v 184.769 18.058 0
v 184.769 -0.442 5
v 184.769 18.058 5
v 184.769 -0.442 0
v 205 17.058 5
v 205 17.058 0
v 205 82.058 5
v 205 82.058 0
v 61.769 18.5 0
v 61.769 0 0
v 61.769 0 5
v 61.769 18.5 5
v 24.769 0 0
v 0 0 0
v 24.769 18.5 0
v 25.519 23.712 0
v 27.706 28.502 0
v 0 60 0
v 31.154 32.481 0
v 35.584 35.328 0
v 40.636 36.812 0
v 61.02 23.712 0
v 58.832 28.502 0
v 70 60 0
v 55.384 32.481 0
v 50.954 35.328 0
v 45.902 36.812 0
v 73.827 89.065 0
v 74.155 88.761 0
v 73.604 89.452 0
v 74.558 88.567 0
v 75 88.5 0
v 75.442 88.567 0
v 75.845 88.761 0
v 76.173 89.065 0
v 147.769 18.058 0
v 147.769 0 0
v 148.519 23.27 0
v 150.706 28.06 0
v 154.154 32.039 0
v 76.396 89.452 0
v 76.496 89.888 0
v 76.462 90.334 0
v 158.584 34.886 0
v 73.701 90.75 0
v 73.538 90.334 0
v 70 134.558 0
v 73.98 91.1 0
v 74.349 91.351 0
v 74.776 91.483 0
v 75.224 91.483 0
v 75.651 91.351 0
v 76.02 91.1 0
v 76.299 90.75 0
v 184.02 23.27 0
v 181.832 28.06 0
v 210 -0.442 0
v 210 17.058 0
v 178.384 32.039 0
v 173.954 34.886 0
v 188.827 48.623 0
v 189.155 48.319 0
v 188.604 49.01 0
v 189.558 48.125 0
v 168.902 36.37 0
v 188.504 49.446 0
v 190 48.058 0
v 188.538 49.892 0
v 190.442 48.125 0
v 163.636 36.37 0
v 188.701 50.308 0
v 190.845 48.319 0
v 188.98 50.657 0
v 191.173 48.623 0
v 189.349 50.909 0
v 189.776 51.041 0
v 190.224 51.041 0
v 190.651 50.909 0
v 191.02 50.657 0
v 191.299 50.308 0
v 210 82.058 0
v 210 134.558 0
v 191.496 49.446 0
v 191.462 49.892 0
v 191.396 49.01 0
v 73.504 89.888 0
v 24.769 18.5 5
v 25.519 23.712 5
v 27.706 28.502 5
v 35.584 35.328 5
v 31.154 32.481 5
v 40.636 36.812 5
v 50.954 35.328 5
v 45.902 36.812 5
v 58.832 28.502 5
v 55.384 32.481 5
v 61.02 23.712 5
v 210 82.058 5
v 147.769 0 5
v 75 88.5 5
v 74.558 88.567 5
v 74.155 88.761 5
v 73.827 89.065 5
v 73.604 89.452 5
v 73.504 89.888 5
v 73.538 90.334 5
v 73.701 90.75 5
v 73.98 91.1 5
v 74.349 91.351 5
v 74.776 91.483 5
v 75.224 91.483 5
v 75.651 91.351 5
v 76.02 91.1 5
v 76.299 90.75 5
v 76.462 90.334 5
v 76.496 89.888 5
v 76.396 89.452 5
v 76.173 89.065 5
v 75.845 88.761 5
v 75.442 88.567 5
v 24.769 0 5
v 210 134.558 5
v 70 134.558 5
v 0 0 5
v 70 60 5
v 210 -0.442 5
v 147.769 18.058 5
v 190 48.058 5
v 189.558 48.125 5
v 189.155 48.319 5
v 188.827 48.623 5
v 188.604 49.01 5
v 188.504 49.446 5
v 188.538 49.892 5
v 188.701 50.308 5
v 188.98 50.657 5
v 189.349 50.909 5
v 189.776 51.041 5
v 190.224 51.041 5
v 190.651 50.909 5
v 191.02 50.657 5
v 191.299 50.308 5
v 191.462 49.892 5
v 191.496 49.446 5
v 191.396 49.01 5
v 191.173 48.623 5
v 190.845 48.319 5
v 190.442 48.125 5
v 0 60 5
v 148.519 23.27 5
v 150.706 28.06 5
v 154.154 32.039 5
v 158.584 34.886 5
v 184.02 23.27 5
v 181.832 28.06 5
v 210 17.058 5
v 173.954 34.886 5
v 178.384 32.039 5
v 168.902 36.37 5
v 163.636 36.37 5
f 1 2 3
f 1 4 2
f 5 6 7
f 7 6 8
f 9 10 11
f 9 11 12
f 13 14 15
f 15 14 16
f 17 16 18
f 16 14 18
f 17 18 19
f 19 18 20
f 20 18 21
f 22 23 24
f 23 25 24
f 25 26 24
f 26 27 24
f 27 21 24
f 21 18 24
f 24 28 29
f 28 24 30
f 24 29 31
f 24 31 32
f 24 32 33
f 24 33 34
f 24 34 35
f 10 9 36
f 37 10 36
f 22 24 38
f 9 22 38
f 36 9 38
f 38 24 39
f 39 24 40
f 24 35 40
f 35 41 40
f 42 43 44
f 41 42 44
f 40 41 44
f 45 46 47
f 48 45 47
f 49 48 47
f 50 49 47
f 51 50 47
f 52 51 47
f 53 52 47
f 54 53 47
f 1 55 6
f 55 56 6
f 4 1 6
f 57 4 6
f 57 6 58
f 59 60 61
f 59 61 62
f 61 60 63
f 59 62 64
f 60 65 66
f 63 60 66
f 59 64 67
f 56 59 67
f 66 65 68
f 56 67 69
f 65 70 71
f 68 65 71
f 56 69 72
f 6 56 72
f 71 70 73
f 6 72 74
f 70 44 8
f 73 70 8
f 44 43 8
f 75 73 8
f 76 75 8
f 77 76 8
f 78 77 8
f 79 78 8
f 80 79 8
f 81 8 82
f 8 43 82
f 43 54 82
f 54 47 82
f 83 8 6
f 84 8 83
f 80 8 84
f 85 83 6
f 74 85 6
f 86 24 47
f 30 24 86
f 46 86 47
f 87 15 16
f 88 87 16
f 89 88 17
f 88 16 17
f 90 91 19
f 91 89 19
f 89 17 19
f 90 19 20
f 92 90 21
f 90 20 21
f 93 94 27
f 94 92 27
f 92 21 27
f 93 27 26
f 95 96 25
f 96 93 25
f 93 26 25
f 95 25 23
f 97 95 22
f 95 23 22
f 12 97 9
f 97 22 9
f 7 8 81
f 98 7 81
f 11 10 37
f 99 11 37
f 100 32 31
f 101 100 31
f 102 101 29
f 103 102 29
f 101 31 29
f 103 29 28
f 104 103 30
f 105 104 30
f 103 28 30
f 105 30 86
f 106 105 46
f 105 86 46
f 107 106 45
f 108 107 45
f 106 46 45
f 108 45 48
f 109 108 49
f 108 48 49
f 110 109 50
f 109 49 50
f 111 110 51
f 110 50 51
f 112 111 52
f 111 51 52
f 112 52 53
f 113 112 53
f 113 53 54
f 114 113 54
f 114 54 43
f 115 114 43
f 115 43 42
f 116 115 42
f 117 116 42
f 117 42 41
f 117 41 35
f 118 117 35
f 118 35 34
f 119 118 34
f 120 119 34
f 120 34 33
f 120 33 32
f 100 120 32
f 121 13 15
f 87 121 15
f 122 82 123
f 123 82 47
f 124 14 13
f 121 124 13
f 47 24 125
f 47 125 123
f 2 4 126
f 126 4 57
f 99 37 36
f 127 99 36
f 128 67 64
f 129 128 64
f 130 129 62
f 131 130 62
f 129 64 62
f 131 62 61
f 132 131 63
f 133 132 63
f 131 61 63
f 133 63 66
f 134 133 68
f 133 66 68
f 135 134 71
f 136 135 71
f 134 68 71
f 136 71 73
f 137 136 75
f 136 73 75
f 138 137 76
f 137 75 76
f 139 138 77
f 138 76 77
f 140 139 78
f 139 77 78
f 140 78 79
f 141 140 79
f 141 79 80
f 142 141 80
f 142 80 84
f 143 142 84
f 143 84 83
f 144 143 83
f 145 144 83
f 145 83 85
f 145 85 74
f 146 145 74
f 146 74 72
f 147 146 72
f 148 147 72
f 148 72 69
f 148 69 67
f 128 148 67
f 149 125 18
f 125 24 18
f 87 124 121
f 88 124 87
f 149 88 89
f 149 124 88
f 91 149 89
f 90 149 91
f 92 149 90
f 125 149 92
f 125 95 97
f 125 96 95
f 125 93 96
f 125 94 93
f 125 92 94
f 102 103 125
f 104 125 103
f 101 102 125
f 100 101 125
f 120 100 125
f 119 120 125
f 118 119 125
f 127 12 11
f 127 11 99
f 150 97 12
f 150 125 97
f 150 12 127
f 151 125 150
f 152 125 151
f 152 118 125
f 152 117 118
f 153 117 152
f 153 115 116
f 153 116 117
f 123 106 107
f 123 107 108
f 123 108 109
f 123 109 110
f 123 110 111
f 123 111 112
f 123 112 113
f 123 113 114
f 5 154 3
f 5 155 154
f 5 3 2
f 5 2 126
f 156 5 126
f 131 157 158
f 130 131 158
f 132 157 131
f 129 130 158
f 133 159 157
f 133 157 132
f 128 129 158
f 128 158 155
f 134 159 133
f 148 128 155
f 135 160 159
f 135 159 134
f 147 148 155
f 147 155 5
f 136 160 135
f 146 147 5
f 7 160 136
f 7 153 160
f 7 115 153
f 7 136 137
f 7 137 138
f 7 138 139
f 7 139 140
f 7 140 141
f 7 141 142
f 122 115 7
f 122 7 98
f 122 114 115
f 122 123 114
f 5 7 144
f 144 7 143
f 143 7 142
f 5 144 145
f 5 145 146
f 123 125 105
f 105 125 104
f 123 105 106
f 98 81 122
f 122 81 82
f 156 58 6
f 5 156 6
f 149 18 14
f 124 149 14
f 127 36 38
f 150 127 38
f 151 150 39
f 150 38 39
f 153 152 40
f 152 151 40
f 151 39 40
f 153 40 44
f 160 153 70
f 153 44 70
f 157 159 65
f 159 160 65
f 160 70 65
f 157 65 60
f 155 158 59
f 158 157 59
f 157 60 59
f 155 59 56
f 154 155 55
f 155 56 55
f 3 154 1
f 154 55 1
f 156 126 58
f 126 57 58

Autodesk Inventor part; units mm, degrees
ref_plane "YZ Plane" through (0, 0, 0) normal (1, 0, 0) x (0, 1, 0)
ref_plane "XZ Plane" through (0, 0, 0) normal (0, 1, 0) x (-1, 0, 0)
ref_plane "XY Plane" through (0, 0, 0) normal (0, 0, 1) x (1, 0, 0)
sketch "Sketch1" plane through (0, 0, 0) normal (0, 0, 1) x (1, 0, 0)
  line L0 (210, -0.4421) -> (210, 134.5579)
  line L1 (210, 134.5579) -> (70, 134.5579)
  line L2 (0, 60) -> (0, 0)
  line L3 (70, 60) -> (0, 60)
  line L4 (0, 60) -> (0, 0)
  line L5 (70, 60) -> (70, 134.5579)
  line L6 (0, 0) -> (24.7692, 0)
  line L7 (70, -0.4421) -> (70, 134.5579) construction
  arc A0 (184.7692, 18.0579) -> (147.7692, 18.0579) centre (166.2692, 18.0579) ccw
  line L8 (147.7692, 0) -> (147.7692, 18.0579)
  line L9 (184.7692, -0.4421) -> (184.7692, 18.0579)
  arc A1 (61.7692, 18.5) -> (24.7692, 18.5) centre (43.2692, 18.5) ccw
  line L10 (24.7692, 0) -> (24.7692, 18.5)
  line L11 (61.7692, 0) -> (61.7692, 18.5)
  line L12 (210, 17.0579) -> (205, 17.0579)
  line L13 (205, 17.0579) -> (205, 82.0579)
  line L14 (205, 82.0579) -> (210, 82.0579)
  line L15 (210, 82.0579) -> (210, 17.0579)
  line L16 (184.7692, -0.4421) -> (210, -0.4421)
  line L17 (61.7692, 0) -> (147.7692, 0)
  dimension "d14" = 210
  dimension "d15" = 70
  dimension "d17" = 37
  dimension "d19" = 37
  dimension "d23" = 5
  dimension "d24" = 65
  dimension "d28" = 52.5
  dimension "d48" = 135
  dimension "d51" = 18.5
  dimension "d52" = 18.5
  dimension "d54" = 18.5
  dimension "d55" = 60
  dimension "d60" = 18.5
  dimension "d61" = 123
extrude "Extrusion1" add sketch "Sketch1" along normal blind 5 contours L16 L9 A0 L8 L17 L11 A1 L10 L6 L2 L3 L5 L1 L0 L14 L13 L12
sketch "Sketch2" plane through (0, 0, 5) normal (0, 0, 1) x (1, 0, 0)
  line L0 (205, 17.0579) -> (205, 82.0579) projected
  line L1 (210, 17.0579) -> (205, 17.0579) projected
  point P0 (0, 0)
  point P1 (190, 49.5579)
  dimension "d36" = 15
  dimension "d37" = 32.5
hole "Hole1" at (190, 49.5579, 5) direction (0, 0, -1) diameter 3 end through all
sketch "Sketch3" plane through (0, 0, 5) normal (0, 0, 1) x (1, 0, 0)
  line L0 (70, 134.5579) -> (70, 60) projected
  line L1 (70, 60) -> (0, 60) projected
  point P0 (0, 0)
  point P1 (75, 90)
  dimension "d45" = 5
  dimension "d46" = 30
hole "Hole2" at (75, 90, 5) direction (0, 0, -1) diameter 3 end through all
properties part number "SIDE_1" material "ABS Plastic"
